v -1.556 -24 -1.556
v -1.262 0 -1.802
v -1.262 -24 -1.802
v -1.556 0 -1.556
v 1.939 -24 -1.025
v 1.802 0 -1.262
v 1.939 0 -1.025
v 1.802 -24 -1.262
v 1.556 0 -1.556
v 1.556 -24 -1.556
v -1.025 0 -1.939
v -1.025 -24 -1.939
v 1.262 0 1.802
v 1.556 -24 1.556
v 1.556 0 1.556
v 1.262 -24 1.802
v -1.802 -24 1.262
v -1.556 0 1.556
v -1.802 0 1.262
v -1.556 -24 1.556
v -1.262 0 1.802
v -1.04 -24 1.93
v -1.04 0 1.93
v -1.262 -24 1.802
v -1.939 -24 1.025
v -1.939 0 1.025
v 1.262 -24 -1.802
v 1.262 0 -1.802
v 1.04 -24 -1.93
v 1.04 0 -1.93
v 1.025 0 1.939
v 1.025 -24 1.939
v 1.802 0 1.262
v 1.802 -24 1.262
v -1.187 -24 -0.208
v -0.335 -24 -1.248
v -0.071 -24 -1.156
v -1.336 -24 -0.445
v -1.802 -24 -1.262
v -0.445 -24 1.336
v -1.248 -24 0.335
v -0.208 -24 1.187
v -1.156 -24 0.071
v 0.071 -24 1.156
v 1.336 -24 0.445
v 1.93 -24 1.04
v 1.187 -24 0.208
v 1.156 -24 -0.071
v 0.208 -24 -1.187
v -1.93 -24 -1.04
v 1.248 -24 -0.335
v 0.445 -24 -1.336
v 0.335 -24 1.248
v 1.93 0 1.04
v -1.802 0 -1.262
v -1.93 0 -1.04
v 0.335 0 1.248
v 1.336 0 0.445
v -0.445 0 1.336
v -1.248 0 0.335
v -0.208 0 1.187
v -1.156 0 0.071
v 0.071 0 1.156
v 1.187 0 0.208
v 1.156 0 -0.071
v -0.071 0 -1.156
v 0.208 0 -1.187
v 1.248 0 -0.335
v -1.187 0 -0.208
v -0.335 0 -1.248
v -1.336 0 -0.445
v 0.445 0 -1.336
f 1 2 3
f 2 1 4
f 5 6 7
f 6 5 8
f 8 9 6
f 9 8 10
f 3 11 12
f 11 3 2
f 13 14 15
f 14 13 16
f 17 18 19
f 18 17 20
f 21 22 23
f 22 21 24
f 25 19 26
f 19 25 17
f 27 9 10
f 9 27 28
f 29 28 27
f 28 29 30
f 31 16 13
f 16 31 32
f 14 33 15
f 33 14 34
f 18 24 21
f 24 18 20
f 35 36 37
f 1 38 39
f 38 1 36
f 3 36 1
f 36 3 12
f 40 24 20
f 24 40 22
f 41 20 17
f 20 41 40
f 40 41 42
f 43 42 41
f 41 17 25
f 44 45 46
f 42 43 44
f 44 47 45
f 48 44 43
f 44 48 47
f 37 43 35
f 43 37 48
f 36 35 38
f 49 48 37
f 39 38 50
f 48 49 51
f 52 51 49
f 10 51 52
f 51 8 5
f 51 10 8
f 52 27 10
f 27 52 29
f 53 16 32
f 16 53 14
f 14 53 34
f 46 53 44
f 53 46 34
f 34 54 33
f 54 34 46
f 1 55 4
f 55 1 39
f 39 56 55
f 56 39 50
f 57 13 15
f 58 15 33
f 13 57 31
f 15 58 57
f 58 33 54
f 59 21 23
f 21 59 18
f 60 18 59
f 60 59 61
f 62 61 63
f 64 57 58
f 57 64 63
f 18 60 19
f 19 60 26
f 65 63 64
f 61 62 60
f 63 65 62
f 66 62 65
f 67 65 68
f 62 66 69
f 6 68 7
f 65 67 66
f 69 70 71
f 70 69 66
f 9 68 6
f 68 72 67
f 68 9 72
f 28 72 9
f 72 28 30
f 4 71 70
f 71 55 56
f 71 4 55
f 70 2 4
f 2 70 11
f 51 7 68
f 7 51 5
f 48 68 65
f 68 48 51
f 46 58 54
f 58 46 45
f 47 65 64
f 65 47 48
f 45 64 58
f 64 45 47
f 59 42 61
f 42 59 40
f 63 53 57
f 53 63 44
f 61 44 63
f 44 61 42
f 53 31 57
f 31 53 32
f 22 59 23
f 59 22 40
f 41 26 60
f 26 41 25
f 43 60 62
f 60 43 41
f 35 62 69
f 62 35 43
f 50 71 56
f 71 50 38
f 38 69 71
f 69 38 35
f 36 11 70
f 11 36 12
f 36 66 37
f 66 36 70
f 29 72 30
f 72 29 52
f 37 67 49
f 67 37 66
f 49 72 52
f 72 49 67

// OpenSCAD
// file: PELA-technic-axle.scad
/*
Parametric PELA Technic-compatible Axle

Published at
    http://www.thingiverse.com/thing:XXXX
Maintained at
    https://github.com/paulirotta/parametric_PELA
See also the related files
    PELA Sign Generator - https://www.thingiverse.com/thing:2546028
    PELA Enclosure Generator - https://www.thingiverse.com/thing:2544197


By Paul Houghton
Twitter: @mobile_rat
Email: paulirotta@gmail.com
Blog: https://medium.com/@paulhoughton

Creative Commons Attribution ShareAlike NonCommercial License
    https://creativecommons.org/licenses/by-sa/4.0/legalcode

Design work kindly sponsored by
    http://futurice.com
*/

include <PELA-parameters.scad>
include <PELA-print-parameters.scad>
use <PELA-block.scad>

/* [PELA Technic-compatible Pin Options] */

// Axle length
axle_length = block_width(3);

// An axle which fits loosely in a technic bearing hole
axle_radius = 2.2;

// Size of the hollow inside an axle
axle_center_radius=2*axle_radius/3;

///////////////

axle();

    
//////////////////


// A round rotation axle
module axle(axle_radius=axle_radius, axle_center_radius=axle_center_radius, axle_length=axle_length) {

    difference() {
        cylinder(r=axle_radius, h=axle_length);
        translate([0, 0, -defeather])
            cylinder(r=axle_center_radius, h=axle_length+2*defeather);
    }
}
// file: PELA-print-parameters.scad
/*
Parametric PELA Print Tuning Parameters

Published at
    http://www.thingiverse.com/thing:2303714
Maintained at
    https://github.com/paulirotta/parametric_PELA
See also the related files
    PELA Sign Generator - https://www.thingiverse.com/thing:2546028
    PELA Enclosure Generator - https://www.thingiverse.com/thing:2544197


By Paul Houghton
Twitter: @mobile_rat
Email: paulirotta@gmail.com
Blog: https://medium.com/@paulhoughton

Creative Commons Attribution ShareAlike NonCommercial License
    https://creativecommons.org/licenses/by-sa/4.0/legalcode

Design work kindly sponsored by
    http://futurice.com

Imported automatically into other design files when you include PELA_parameters:
    include <PELA_parameters.scad>
 

INSTRUCTIONS
============
1. Test print PELA_calibration.scad

2. Choose a fit with real PELA

3. Enter those  numbers here. Most commonly you only adjust the top_tweak, bottom_tweak
   and side_connector_tweak numbers to match for your current use case and
   material/printer/slicer settings. Add comment to this file to help remember what you
   have calibrated now and in the past.

4. Print a couple of 4x4 blocks with these adjusted parameters

5. Confirm your calibration fit with real PELA and between two printed blocks.

6. All other models in this set will automatically now be adjusted to use your calibration numbers.


SUGGESTIONS
===========
- Don't waste time- use high precision, injection-moulded PELA parts when they are suitable and available.

- Layer height is not paricularly important, you can use your "standard" setting.

- If needed for a good snap fit, slow down or make similar adjustments to show fine details
  and strong inter-layer adhesion (especially with flexible materials).

- Some printing materials are slippery, not very flexible, or subject to small chips breaking off. This
  can affect the fit and part lifeime. In such cases, look at other parameters such as knob_height and
  geometric flexture adjustments to avoid making your calibration is more tight than needed for your
  application.

- Smaller nozzles give better results. The models are adjusted to work on FFF nozzles up to about 0.6mm
  diameter.
  
- Be patient. You can achieve a great fit and make many things with blocks. 
*/


/* [3D Printing Filament Adjustments] */

// Switch between flexible and rigid material geometry
flexible_material = true;

// Adjust gemoetry to aid the slicer when the minimum trace width is a problem (nozzle is > 0.5mm). This adjustments prevents geometry too thin to reproduce reliably in high speed or flexible material processing. Some features such as the ability to insert knobs into 1/2 unit sockets will be lost to accomodate thicker parts.
large_nozzle = true;

// Thickness of the solid outside surface of the block
shell = large_nozzle ? 1.2 : 1.0;

// Thickness of the solid top surface of the block
top_shell = 1.4;


/* [3D Printing Top Connector Adjustments] */

// Top knob size adjustment (larger is a stiffer fit, add in multiples of 0.01mm as determined from your calibration-block print)
top_tweak = 0.03;

// Size of the top connectors (note that some plastics are more slippery or brittle than ABS and this may negatively affect results or part lifetime, the value below is tuned for Taz 6 with 0.5 nozzle, Lulzbot Cura default and NGEN)
knob_radius = 2.45 + 0.11 + top_tweak;

// Distance below knob top surface and the internal flexture
knob_top_thickness = 0.8;

// Height of the connectors (1.8 is PELA standard, 2 may give a stronger hold while still maintaining compatibility)
knob_height = flexible_material ? 9.6/3 : 1.8;

// Size of the small flexture cavity inside each knob (default is 1.4, set to 0 for flexible materials)
knob_flexture_radius = flexible_material ? 0.0 : 1.4;

// Height of the easy connect slope near connector top (0 to disable such as for flexible materials, a bigger value such as 0.1 may help ease a tightly tuned fit or compensate for overextrusion)
knob_bevel = flexible_material ? 0.3 : 0.0;


/* [3D Printing Bottom Connector Adjustments] */

// Bottom connector size adjustment (larger is a stiffer fit, add in multiples of 0.01mm as determined from your calibration-block print)
bottom_tweak = 0;

// Bottom connector flexture ring size (note that some plastics are more slippery or brittle than ABS and this may negatively affect results or part lifetime, the value below is tuned for Taz 6 with 0.5 nozzle, Lulzbot Cura default and NGEN)
ring_thickness = large_nozzle ? 1.2 : 0.8;

// Bottom connector flexture ring size (note that some plastics are more slippery or brittle than ABS and this may negatively affect results or part lifetime, the value below is tuned for Taz 6 with 0.5 nozzle, Lulzbot Cura default and NGEN)
ring_radius = 2.75 + ring_thickness + bottom_tweak;

// Base distance which small stiffeners protrude inwards from outside shell edges of a block to hold the knobs of any block below
outside_lock_thickness = 1.44 + bottom_tweak;

// Additional distance from outside lock and connector rings which small flexture-fit rims protrude inwards to grab the base of knobs for asymmetric side pressure to assist a snap fit
side_lock_thickness = 0.02;


/* [3D Printing Side Connector Adjustments] */

// Side connector size adjustment (larger is a looser fit, add in multiples of 0.01mm as determined from your calibration-block print)
axle_hole_tweak = 0.0;

// Technic connector hole
axle_hole_radius = 2.45 + 0.02 + axle_hole_tweak;
// file: PELA-parameters.scad
/*
Parametric PELA Block Parameters

Published at
    http://www.thingiverse.com/thing:2303714
Maintained at
    https://github.com/paulirotta/parametric_PELA
See also the related files
    PELA Sign Generator - https://www.thingiverse.com/thing:2546028
    PELA Enclosure Generator - https://www.thingiverse.com/thing:2544197


By Paul Houghton
Twitter: @mobile_rat
Email: paulirotta@gmail.com
Blog: https://medium.com/@paulhoughton

Creative Commons Attribution ShareAlike NonCommercial License
    https://creativecommons.org/licenses/by-sa/4.0/legalcode

Design work kindly sponsored by
    http://futurice.com

Import this into other design files to set baseline constants:
    include <PELA_parameters.scad>
*/

/* [PELA-compatible Options] */

// Length of the block (PELA unit count)
l = 4; 

// Width of the block (PELA unit count)
w = 2;

// Height of the block (PELA unit count)
h = 1;


/* [Basic Block Features] */

// Presence of bottom connector sockets
sockets= 1; // [0:no sockets, 1:sockets]

// Presence of top connector knobs
knobs=1; // [0:disabled, 1:enabled]

// Place holes in the corners for mountings screws (0=>no holes, 1=>holes)
bolt_holes=0; // [0:no holes, 1:holes]

// Size of corner holes for M3 mountings bolts
bolt_hole_radius=1.5;

// Interior fill for layers above the bottom
solid_upper_layers = 0; // [0:empty, 1:solid]

// Interior fill for layers above the bottom
solid_bottom_layer = 0; // [0:empty, 1:solid]


/* [Technic-compatible Block Features] */

// Add full width through holes spaced along the length for PELA Techics connectors
side_holes = 0;  // [0:disabled, 1:short air vents, 2:short connectors, 3:full width connectors]

// Add a sheath around Technic side holes (only used if there are side_holes, disable for extra ventilation, enable for connector lock notches)
side_sheaths = 1; // [0:disabled, 1:enabled]

// Add short end holes spaced along the width for PELA Techics connectors
end_holes = 2;  // [0:disabled, 1:short air vents, 2:short connectors, 3:full length connectors]

// Add a sheath around end holes  (only used if there are end_holes, disable for extra ventilation, enable for connector lock notches)
end_sheaths = 1; // [0:disabled, 1:enabled]

// Add holes in the top deck to improve airflow and reduce weight
top_vents = 1; // [0:disabled, 1:enabled]

// Size of a hole in the top of each knob to keep the cutout as part of the outside surface (slicer-friendly manifold shape). 0 to disable or use for air circulation/aesthetics/drain resin from the cutout, but larger holes change flexture such that knobs may not hold as well.
knob_vent_radius = 0;


/* [Aesthetic Options for Basic Blocks] */

// Width of a line etched in the side of multi-layer block sets (0 to disable)
ridge_width = 0.15;

// Depth of a line etched in the side of multi-layer block sets
ridge_depth = 0.3;



include <PELA-print-parameters.scad>

function dummy(x)=x; // This first function will block all uncommon parameters below from appearing in the online customizer


/* [Advanced Options for Basic Blocks] */

// Minimum angle to approximate a circle
$fa=10;

// Minimum segment length to approximate a circle
$fs=0.3;

// [0:hidden, 1:display where knobs of a block below would be ]
show_shadow_knobs = 1;

// Basic unit horizontal size of each block
block_width=8;

// Basic unit vertical size of each block
block_height=9.6;

// Horizontal clearance space around the outer surface of the set of blocks to allow two parts to be placed next to one another
skin = 0.1;

// Height of the hole beneath each knob which facilitates click lock in low-flex materials by variable side pressure on any block above
knob_flexture_height=4.5;

// Width of horizontal surface strengthening slats between the bottom rings
bottom_stiffener_width=2.6;

// Height of horizontal surface strengthening slats (appears between the bottom rings, default is print-parameters.scad:knob_height)
bottom_stiffener_height=knob_height;


/* [Advanced Options for Technic-compatible Blocks] */

// Technic connector inset radius
counterbore_inset_radius = 3.1;

// Technic connector inset depth
counterbore_inset_depth = 0.8;

// Contact length of axle to brick (not including inset length and end snap fit flexture in pin connectors)
peg_length = 6.5;

// Size of an optional cylinder wrapped around the bearing holes
bearing_sheath_thickness = 0.9;

/* [Hidden] */

// Slight visual offset to work around prevent goldfeather rendering bugs in OpenSCAD (visual, not affecting final print geometry)
defeather = 0.01;

// Roundness of bottom connector rings (Use 8 for octagonal sockets- many parts of the geomoetry must be adjusted if you change this)
ring_fn=8;
// main file
/*
Parametric PELA Technic-compatible cross-shaped rotational drive Axle

Published at
    http://www.thingiverse.com/thing:XXXX
Maintained at
    https://github.com/paulirotta/parametric_PELA
See also the related files
    PELA Sign Generator - https://www.thingiverse.com/thing:2546028
    PELA Enclosure Generator - https://www.thingiverse.com/thing:2544197


By Paul Houghton
Twitter: @mobile_rat
Email: paulirotta@gmail.com
Blog: https://medium.com/@paulhoughton

Creative Commons Attribution ShareAlike NonCommercial License
    https://creativecommons.org/licenses/by-sa/4.0/legalcode

Design work kindly sponsored by
    http://futurice.com
*/

include <PELA-parameters.scad>
include <PELA-print-parameters.scad>
use <PELA-block.scad>
use <PELA-technic-axle.scad>

/* [PELA Technic-compatible Pin Options] */

// Axle length
axle_length = block_width(3);

// Outside radius of an axle which fits loosely in a technic bearing hole
axle_radius = 2.2;

// Cross axle inside rounding radius
axle_rounding=0.63;

// Size of the hollow inside an axle
axle_center_radius=2*axle_radius/3;

///////////////

cross_axle();
    
//////////////////


// A rotation axle with a "+" cross section
module cross_axle(axle_rounding=axle_rounding, axle_radius=axle_radius, axle_length=axle_length) {

    rotate([90, 45, 0])
        difference() {
            axle(axle_radius=axle_radius, axle_center_radius=0, length=axle_length);        
            axle_cross_negative_space(axle_rounding=axle_rounding, axle_radius=axle_radius, axle_length=axle_length);
        }
}


// That which is cut away four times from a solid to create a cross axle
module axle_cross_negative_space(axle_rounding=axle_rounding, axle_radius=axle_radius, axle_length=axle_length) {
    
    for (rot=[0:90:270]) {
        rotate([0, 0, rot])
            hull() {
                translate([axle_rounding*2, axle_rounding*2, -defeather]) {
                    cylinder(r=axle_rounding, h=axle_length+2*defeather);

                    translate([axle_radius, 0, 0])
                        cylinder(r=axle_rounding, h=axle_length+2*defeather);

                    translate([0, axle_radius, 0])
                        cylinder(r=axle_rounding, h=axle_length+2*defeather);
                }
            }
    }
}
